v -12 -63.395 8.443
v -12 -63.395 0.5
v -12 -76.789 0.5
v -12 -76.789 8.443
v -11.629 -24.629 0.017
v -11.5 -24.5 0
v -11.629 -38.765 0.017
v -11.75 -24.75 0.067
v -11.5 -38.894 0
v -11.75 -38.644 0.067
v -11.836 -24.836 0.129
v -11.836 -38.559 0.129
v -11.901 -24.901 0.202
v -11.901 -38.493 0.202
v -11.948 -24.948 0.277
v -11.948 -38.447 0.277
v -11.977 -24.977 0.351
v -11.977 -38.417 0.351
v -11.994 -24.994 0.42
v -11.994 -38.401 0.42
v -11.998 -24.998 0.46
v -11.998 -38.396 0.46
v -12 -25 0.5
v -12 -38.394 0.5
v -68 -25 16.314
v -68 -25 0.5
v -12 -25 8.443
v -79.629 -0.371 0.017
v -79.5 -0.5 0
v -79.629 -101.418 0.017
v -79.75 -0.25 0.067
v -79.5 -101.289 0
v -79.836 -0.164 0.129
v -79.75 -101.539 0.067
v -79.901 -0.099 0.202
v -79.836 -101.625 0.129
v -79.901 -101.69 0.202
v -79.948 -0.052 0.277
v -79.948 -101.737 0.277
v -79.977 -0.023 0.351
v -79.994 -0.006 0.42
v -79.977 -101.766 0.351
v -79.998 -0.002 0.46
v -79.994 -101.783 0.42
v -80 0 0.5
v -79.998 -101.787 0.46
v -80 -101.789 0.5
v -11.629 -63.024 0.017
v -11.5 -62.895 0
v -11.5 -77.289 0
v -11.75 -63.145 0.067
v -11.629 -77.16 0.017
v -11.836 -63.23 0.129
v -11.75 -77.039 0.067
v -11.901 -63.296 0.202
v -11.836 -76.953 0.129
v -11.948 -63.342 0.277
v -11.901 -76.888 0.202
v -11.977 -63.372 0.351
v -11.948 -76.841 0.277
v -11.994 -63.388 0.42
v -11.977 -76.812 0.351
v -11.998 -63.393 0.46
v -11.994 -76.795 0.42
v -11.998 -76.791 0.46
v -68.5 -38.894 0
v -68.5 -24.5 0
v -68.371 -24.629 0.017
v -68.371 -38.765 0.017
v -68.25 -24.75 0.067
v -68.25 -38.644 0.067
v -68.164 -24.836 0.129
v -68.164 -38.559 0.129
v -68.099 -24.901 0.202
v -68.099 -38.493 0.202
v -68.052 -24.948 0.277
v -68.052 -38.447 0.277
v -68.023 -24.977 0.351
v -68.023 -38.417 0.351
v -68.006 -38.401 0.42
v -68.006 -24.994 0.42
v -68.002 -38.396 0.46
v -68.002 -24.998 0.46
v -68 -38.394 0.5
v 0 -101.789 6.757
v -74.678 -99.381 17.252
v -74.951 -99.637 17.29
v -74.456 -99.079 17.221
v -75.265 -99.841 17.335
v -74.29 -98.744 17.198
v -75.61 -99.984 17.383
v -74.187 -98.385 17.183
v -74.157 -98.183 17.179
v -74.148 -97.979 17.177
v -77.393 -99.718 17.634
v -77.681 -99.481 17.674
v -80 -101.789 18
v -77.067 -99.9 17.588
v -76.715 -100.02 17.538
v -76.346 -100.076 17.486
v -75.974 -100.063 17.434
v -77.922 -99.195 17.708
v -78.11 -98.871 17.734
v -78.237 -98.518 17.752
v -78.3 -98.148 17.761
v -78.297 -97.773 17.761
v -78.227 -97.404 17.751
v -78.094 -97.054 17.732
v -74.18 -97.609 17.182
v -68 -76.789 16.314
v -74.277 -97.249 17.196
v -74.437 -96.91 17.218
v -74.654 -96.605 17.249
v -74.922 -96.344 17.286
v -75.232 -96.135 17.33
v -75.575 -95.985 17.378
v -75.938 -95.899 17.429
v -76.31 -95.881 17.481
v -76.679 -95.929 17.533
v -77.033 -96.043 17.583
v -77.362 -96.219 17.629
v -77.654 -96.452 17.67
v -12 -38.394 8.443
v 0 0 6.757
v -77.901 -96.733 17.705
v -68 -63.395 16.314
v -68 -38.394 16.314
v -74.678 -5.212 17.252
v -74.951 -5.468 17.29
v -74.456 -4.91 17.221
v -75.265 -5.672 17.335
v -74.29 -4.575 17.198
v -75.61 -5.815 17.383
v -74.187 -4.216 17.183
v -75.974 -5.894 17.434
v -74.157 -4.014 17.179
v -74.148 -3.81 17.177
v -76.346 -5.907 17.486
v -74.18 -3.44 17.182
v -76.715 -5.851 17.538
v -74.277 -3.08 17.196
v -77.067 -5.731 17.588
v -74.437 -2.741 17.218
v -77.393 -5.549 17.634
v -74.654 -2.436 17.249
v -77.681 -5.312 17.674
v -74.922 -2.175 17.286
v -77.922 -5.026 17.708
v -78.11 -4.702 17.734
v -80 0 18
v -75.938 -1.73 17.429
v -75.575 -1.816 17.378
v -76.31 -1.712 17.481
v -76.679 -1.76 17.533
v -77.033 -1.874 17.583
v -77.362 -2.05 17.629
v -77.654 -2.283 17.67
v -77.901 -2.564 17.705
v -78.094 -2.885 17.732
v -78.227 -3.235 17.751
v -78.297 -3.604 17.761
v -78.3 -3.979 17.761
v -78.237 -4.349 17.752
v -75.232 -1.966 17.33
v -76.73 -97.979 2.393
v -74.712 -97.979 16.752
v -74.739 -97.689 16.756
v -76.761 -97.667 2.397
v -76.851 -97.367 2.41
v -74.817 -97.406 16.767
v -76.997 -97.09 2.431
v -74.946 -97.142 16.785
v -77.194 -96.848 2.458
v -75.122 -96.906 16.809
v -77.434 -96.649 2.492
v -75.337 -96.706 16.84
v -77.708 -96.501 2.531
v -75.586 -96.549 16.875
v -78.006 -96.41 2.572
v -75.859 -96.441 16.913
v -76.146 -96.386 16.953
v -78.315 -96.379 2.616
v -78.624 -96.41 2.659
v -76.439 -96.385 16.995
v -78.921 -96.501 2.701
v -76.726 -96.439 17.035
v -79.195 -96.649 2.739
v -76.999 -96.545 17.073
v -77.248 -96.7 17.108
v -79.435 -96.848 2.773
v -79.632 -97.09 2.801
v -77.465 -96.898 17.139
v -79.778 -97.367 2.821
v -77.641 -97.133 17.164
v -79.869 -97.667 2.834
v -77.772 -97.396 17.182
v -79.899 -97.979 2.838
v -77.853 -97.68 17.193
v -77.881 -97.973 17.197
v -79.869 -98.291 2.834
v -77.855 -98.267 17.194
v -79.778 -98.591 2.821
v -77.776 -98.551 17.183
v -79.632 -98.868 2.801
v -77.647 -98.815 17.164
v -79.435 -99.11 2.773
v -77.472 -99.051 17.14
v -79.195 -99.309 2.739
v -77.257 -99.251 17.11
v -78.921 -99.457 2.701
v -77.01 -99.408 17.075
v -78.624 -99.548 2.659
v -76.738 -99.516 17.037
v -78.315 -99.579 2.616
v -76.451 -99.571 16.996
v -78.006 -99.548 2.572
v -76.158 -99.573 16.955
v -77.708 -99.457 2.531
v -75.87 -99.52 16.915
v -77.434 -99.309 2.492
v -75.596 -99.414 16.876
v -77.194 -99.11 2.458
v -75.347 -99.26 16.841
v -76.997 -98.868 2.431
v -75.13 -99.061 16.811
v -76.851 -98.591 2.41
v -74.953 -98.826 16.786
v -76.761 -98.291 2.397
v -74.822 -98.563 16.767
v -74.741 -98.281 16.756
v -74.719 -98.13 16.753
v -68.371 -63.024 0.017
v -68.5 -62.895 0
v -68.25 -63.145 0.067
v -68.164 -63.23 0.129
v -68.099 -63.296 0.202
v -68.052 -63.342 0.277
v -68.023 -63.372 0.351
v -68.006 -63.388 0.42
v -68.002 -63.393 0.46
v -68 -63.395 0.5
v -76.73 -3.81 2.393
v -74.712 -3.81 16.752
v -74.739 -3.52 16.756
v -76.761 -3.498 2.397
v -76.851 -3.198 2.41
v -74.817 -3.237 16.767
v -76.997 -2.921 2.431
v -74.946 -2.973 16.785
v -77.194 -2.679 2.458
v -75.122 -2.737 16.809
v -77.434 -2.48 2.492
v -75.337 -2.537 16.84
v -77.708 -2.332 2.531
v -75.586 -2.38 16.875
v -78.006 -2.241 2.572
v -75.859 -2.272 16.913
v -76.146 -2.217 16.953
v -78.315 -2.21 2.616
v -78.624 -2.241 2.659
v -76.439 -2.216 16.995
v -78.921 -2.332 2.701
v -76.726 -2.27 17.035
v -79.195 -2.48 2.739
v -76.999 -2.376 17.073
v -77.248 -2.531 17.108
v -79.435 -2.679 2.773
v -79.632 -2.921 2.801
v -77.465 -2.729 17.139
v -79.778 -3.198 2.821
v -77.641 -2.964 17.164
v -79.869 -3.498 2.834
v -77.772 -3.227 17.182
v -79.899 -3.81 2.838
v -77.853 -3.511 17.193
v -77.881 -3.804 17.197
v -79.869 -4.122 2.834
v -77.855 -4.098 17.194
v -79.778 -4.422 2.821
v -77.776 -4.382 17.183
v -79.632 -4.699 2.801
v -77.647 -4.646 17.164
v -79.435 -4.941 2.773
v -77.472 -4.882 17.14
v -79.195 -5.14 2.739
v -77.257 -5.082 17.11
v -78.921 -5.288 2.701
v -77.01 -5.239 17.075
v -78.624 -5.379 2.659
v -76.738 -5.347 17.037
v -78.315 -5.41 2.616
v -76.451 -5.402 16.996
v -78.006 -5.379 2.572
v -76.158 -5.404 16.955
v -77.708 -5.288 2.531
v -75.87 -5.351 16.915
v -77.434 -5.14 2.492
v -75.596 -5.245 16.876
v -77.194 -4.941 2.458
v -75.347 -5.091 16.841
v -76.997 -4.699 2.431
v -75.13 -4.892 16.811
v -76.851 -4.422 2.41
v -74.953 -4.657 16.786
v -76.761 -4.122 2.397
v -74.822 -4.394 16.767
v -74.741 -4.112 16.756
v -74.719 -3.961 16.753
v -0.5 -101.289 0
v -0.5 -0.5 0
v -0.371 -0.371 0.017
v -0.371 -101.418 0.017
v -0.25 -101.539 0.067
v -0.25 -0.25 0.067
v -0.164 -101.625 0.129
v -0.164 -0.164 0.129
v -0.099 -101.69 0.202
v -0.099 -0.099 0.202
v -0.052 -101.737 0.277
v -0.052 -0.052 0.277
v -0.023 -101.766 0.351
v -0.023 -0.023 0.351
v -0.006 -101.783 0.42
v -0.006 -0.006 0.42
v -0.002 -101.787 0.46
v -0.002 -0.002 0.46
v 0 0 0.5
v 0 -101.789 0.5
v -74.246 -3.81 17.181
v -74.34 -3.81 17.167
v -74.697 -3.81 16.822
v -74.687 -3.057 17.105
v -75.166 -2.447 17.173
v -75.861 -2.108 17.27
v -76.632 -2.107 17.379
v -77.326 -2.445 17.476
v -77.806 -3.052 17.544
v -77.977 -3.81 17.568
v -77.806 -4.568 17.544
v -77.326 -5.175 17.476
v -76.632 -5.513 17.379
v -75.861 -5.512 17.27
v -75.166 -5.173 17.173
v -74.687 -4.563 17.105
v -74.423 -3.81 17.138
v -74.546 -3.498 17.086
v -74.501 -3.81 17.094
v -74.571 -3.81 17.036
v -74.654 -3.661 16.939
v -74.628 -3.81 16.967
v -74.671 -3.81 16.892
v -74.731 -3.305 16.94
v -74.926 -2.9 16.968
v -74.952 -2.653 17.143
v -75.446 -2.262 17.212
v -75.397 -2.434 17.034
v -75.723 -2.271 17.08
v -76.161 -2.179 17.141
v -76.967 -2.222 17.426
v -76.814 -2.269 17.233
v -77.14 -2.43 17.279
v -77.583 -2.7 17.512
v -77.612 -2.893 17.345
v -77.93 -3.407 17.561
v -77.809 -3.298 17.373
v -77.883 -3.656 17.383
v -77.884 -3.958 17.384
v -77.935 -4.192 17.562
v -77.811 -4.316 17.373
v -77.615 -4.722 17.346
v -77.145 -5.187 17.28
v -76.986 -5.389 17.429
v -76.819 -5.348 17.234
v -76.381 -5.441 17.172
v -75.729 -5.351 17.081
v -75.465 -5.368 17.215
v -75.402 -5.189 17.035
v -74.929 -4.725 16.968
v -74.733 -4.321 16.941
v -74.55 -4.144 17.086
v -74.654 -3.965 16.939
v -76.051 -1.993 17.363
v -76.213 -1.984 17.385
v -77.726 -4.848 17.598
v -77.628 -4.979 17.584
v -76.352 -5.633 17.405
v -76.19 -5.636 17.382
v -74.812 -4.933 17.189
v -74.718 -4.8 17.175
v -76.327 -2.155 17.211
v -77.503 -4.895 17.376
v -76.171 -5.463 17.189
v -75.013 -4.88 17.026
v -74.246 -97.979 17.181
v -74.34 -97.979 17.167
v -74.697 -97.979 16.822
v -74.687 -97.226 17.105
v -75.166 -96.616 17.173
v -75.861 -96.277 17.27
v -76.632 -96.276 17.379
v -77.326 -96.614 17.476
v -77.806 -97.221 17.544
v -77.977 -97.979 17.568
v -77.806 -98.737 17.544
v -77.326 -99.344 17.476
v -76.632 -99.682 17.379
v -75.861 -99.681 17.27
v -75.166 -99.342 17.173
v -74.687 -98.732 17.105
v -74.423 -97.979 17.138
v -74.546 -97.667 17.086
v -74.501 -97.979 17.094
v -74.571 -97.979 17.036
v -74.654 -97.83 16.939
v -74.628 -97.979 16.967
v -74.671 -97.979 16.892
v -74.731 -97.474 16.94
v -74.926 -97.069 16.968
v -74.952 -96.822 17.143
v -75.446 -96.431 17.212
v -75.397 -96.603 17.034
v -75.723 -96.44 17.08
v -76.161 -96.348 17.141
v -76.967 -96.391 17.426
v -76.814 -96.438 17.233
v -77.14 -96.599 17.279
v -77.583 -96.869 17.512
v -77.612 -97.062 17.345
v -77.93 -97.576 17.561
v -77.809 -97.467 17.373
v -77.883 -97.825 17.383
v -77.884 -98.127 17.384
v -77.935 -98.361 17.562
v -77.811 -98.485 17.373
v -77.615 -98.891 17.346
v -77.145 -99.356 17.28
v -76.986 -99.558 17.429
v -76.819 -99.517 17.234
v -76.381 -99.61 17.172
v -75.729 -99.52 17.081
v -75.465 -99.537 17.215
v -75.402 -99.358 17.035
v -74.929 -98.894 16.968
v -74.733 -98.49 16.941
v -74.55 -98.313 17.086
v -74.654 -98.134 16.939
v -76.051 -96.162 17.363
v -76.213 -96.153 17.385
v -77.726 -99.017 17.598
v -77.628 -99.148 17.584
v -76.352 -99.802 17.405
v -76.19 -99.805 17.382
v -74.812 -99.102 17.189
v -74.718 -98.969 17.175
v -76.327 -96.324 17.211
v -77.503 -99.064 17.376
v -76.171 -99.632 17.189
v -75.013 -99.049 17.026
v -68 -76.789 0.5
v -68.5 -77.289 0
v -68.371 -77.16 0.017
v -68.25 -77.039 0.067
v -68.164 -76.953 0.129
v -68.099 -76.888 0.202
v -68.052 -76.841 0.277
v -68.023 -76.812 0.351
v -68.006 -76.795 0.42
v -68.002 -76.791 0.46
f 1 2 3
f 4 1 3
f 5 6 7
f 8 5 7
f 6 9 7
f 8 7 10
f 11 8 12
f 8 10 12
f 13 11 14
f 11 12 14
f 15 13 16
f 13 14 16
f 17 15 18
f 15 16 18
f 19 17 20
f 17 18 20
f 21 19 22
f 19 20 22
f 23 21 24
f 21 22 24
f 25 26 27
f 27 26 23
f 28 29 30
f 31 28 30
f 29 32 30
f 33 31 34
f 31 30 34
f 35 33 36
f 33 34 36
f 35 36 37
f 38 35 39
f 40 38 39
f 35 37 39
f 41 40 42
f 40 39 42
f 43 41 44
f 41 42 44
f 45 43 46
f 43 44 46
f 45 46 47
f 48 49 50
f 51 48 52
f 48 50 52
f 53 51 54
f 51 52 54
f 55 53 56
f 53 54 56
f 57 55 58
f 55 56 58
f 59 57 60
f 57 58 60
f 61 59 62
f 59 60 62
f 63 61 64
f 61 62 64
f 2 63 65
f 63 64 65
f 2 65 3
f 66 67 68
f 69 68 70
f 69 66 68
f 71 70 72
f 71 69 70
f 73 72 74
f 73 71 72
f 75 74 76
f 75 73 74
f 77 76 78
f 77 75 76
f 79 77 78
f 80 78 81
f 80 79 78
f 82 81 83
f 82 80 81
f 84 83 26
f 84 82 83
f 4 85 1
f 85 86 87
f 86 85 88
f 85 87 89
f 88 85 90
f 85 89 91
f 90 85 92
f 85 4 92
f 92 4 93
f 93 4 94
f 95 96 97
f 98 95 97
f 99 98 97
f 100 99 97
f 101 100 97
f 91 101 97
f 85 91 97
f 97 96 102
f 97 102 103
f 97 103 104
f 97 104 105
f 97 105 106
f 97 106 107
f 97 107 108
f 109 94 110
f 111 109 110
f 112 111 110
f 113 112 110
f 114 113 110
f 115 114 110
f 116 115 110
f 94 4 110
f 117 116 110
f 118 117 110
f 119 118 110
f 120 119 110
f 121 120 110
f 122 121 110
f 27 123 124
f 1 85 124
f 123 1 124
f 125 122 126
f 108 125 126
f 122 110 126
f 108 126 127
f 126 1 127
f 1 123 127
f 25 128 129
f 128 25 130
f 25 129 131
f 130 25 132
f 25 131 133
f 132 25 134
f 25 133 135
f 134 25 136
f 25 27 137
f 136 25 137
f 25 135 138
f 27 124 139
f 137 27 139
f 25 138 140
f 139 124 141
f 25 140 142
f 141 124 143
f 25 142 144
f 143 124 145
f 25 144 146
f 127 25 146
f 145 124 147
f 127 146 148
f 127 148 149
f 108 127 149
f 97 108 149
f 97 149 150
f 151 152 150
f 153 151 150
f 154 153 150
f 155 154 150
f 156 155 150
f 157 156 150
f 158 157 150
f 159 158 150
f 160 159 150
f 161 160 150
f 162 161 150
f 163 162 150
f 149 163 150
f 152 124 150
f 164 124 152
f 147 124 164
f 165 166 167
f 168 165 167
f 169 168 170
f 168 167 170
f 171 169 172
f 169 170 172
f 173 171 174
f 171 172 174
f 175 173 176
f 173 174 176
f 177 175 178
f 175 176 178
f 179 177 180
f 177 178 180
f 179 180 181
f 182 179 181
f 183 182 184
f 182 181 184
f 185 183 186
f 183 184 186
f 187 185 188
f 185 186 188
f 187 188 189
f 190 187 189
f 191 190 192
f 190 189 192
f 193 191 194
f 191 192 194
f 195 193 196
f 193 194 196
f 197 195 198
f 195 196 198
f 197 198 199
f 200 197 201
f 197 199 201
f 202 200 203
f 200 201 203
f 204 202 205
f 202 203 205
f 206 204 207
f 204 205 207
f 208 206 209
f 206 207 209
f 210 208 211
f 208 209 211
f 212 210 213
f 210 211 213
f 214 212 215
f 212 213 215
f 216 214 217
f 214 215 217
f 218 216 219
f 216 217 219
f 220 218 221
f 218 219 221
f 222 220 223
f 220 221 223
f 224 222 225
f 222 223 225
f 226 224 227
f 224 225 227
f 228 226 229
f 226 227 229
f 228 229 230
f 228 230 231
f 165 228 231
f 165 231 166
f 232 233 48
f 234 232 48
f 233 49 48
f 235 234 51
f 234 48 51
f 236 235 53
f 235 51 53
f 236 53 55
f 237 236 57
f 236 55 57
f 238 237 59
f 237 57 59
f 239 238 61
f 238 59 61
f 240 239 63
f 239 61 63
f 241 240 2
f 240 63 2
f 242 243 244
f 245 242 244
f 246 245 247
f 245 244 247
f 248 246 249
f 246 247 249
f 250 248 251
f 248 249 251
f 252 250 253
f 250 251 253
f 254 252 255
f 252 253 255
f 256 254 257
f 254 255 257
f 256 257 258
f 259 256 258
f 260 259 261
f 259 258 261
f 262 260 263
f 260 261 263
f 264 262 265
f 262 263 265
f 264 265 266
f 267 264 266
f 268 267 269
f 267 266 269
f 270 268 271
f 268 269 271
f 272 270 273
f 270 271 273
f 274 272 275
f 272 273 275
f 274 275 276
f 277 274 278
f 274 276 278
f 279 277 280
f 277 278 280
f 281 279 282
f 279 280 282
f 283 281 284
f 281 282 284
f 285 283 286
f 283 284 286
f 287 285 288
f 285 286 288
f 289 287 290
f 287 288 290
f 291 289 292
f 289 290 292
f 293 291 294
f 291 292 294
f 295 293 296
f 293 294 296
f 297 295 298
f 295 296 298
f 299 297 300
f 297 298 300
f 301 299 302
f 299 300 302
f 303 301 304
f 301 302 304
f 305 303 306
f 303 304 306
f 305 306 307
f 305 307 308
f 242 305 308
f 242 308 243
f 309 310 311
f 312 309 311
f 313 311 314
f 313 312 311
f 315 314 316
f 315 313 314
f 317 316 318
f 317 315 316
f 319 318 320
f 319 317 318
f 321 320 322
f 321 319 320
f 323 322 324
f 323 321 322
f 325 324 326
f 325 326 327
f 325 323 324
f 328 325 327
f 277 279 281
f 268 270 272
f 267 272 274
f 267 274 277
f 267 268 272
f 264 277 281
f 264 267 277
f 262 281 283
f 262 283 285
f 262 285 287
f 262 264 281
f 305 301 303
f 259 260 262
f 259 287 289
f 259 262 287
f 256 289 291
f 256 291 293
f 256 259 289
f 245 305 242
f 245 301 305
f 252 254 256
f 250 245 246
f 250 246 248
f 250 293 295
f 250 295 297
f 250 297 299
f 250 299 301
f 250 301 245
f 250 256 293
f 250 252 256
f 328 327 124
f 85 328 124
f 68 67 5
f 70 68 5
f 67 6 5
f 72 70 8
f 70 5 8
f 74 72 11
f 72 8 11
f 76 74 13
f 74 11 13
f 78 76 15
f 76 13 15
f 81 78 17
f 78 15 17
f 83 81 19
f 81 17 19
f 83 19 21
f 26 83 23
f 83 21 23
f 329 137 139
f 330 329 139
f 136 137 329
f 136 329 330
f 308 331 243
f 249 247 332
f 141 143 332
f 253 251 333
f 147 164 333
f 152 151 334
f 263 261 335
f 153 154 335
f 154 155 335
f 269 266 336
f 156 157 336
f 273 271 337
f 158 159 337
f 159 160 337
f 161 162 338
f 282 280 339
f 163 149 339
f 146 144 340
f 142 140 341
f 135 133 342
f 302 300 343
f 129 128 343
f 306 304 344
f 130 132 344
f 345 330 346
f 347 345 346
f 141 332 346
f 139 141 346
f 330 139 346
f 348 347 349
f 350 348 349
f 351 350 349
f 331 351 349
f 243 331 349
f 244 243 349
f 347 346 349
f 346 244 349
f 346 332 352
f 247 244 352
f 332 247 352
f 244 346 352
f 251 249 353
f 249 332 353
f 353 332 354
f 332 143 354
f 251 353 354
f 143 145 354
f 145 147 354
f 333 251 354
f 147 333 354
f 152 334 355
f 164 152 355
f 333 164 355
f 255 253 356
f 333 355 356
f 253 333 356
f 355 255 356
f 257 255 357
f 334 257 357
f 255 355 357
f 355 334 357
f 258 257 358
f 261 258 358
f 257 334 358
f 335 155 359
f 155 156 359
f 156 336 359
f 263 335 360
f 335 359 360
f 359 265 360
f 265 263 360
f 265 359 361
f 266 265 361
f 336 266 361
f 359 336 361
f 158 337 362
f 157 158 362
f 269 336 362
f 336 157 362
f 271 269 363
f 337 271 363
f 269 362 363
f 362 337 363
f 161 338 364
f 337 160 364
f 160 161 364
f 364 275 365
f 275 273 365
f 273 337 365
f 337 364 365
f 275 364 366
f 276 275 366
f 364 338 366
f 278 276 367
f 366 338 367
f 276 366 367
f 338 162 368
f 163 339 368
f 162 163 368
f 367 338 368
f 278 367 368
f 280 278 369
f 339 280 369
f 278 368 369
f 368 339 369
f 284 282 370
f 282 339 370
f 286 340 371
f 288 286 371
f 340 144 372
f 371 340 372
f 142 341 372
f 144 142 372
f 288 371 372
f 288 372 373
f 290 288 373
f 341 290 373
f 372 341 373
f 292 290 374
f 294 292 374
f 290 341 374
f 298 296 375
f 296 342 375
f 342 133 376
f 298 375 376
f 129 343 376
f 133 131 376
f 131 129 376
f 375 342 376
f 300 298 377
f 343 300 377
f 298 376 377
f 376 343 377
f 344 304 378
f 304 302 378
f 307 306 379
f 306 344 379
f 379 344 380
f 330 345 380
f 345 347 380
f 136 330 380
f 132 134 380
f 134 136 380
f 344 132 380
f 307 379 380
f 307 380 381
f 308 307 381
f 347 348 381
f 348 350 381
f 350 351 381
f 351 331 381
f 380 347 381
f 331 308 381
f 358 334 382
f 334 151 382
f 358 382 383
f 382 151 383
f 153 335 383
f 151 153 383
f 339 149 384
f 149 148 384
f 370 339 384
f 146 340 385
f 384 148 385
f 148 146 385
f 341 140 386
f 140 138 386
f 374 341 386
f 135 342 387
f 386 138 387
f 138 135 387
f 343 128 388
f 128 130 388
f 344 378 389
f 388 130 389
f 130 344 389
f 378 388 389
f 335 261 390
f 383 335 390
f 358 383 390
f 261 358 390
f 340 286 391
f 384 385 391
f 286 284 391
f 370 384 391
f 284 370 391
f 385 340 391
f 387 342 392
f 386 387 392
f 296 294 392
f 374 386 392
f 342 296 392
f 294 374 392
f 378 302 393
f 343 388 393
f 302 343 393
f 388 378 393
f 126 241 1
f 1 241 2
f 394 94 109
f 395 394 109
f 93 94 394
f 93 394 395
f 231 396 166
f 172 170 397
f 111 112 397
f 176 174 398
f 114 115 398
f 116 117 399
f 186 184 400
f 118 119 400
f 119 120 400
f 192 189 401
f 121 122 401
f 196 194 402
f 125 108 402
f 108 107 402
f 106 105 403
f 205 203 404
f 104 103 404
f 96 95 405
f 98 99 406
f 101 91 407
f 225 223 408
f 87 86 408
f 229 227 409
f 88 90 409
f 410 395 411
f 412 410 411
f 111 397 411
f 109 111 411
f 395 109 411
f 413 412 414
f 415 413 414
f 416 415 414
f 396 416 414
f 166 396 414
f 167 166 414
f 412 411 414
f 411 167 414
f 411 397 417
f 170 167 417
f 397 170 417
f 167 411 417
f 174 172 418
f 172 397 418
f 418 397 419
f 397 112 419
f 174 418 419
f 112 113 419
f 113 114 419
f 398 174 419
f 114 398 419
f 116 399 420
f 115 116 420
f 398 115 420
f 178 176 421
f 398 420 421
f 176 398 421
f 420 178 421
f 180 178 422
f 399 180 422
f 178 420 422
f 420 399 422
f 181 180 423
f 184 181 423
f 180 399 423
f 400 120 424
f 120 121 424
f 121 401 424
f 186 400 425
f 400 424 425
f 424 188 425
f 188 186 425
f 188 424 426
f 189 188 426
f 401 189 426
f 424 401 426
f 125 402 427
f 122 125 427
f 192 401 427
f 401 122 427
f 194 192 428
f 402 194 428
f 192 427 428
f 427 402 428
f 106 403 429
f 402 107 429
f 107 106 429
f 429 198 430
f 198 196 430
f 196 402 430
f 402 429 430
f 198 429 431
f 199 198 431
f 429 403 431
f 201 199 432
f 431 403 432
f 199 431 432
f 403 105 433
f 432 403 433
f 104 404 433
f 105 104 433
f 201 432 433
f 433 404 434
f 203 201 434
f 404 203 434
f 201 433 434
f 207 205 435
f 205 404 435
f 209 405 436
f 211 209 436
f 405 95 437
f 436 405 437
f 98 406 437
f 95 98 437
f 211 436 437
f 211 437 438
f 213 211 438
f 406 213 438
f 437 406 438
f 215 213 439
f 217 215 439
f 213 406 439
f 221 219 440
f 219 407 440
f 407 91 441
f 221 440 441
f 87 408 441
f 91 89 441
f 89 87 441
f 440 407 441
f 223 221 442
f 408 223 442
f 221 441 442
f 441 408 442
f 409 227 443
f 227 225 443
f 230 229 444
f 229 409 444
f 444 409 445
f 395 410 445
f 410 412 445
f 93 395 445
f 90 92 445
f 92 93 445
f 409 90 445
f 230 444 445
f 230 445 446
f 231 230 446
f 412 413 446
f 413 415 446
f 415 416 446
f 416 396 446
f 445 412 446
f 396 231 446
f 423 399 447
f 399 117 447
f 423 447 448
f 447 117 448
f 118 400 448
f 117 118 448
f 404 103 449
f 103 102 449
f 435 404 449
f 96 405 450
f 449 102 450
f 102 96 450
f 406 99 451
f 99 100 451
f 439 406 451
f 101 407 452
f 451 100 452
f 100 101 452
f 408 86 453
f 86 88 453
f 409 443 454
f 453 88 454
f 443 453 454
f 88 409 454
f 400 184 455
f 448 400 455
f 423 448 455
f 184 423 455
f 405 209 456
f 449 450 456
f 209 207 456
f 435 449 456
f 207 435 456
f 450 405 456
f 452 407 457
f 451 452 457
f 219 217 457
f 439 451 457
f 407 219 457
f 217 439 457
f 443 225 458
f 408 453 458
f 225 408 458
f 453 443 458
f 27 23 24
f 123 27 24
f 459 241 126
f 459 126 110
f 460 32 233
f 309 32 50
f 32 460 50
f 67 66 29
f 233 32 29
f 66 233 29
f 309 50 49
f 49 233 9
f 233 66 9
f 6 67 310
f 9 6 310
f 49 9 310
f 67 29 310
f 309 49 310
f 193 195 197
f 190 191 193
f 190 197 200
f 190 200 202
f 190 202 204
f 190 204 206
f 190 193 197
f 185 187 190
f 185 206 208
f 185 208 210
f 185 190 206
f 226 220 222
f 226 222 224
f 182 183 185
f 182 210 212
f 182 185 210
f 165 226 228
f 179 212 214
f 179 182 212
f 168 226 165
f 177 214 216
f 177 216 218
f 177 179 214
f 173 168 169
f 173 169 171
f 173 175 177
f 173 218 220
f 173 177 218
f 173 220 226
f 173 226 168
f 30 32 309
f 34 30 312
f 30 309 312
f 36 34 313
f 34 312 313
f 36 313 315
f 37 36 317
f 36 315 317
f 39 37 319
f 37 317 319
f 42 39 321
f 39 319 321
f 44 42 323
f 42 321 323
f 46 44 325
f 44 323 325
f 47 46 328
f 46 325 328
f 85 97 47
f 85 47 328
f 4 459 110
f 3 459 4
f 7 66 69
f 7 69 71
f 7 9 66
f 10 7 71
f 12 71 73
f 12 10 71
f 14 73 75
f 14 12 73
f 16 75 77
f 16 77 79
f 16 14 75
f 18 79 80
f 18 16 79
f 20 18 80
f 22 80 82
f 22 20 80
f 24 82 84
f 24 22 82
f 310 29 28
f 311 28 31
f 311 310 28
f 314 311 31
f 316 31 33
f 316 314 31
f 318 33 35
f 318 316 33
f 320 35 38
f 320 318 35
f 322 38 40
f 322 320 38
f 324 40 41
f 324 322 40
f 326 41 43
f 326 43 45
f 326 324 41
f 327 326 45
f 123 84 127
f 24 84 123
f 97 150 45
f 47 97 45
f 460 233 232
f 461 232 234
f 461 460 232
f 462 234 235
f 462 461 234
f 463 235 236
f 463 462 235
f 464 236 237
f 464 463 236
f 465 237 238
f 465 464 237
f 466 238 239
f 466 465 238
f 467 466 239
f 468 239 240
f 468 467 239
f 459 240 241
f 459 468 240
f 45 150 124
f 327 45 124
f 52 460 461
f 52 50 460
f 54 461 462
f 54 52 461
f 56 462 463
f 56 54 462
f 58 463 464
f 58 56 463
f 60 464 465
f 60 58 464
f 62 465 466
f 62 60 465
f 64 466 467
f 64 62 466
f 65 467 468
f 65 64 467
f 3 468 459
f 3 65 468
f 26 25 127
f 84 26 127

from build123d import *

# Parameters (mm, degrees)
F1_DEPTH = 101.789
F2_W     = 56
F2_H     = 13.3945
F3_DEPTH = 25
F4_R     = 1.6
F5_DEPTH = 15
F6_R     = 0.5


with BuildPart() as f1:
    # F0 (on Front) → F1 (new body)
    with BuildSketch(Plane.XZ):
        Polygon((-80, 0), (0, 0), (0, 6.7567332238), (-80, 18), align=None)
    extrude(amount=F1_DEPTH)

    # F2 (on face) → F3 (cut)
    with BuildSketch(Plane(origin=(0, 0, 0), x_dir=(1, 0, 0), z_dir=(0, 0, -1))):
        with Locations((-40, 70.09175)):
            Rectangle(F2_W, F2_H)
        with Locations((-40, 31.69725)):
            Rectangle(F2_W, F2_H)
    extrude(amount=-F3_DEPTH, mode=Mode.SUBTRACT)

    # F4 (on face) → F5 (cut)
    with BuildSketch(Plane(origin=(0.9312040399, 0, 6.6258610308), x_dir=(0.9902680687, 0, -0.139173101), z_dir=(0.139173101, 0, 0.9902680687))):
        with Locations((-77.9165613166, -3.81)):
            Circle(F4_R)
        with Locations((-77.9165613166, -97.979)):
            Circle(F4_R)
    extrude(amount=-F5_DEPTH, mode=Mode.SUBTRACT)

    # F6
    f6_edges = [f1.edges().sort_by_distance(p)[0] for p in [
        (-77.811508, -97.979, 17.692427),
        (-77.811508, -3.81, 17.692427),
        (-80, -50.8945, 0),
        (-40, 0, 0),
        (-40, -101.789, 0),
        (0, -50.8945, 0),
        (-12, -70.09175, 0),
        (-40, -63.3945, 0),
        (-68, -70.09175, 0),
        (-40, -76.789, 0),
        (-40, -25, 0),
        (-68, -31.69725, 0),
        (-40, -38.3945, 0),
        (-12, -31.69725, 0),
    ]]
    fillet(f6_edges, radius=F6_R)


solid = f1.part
